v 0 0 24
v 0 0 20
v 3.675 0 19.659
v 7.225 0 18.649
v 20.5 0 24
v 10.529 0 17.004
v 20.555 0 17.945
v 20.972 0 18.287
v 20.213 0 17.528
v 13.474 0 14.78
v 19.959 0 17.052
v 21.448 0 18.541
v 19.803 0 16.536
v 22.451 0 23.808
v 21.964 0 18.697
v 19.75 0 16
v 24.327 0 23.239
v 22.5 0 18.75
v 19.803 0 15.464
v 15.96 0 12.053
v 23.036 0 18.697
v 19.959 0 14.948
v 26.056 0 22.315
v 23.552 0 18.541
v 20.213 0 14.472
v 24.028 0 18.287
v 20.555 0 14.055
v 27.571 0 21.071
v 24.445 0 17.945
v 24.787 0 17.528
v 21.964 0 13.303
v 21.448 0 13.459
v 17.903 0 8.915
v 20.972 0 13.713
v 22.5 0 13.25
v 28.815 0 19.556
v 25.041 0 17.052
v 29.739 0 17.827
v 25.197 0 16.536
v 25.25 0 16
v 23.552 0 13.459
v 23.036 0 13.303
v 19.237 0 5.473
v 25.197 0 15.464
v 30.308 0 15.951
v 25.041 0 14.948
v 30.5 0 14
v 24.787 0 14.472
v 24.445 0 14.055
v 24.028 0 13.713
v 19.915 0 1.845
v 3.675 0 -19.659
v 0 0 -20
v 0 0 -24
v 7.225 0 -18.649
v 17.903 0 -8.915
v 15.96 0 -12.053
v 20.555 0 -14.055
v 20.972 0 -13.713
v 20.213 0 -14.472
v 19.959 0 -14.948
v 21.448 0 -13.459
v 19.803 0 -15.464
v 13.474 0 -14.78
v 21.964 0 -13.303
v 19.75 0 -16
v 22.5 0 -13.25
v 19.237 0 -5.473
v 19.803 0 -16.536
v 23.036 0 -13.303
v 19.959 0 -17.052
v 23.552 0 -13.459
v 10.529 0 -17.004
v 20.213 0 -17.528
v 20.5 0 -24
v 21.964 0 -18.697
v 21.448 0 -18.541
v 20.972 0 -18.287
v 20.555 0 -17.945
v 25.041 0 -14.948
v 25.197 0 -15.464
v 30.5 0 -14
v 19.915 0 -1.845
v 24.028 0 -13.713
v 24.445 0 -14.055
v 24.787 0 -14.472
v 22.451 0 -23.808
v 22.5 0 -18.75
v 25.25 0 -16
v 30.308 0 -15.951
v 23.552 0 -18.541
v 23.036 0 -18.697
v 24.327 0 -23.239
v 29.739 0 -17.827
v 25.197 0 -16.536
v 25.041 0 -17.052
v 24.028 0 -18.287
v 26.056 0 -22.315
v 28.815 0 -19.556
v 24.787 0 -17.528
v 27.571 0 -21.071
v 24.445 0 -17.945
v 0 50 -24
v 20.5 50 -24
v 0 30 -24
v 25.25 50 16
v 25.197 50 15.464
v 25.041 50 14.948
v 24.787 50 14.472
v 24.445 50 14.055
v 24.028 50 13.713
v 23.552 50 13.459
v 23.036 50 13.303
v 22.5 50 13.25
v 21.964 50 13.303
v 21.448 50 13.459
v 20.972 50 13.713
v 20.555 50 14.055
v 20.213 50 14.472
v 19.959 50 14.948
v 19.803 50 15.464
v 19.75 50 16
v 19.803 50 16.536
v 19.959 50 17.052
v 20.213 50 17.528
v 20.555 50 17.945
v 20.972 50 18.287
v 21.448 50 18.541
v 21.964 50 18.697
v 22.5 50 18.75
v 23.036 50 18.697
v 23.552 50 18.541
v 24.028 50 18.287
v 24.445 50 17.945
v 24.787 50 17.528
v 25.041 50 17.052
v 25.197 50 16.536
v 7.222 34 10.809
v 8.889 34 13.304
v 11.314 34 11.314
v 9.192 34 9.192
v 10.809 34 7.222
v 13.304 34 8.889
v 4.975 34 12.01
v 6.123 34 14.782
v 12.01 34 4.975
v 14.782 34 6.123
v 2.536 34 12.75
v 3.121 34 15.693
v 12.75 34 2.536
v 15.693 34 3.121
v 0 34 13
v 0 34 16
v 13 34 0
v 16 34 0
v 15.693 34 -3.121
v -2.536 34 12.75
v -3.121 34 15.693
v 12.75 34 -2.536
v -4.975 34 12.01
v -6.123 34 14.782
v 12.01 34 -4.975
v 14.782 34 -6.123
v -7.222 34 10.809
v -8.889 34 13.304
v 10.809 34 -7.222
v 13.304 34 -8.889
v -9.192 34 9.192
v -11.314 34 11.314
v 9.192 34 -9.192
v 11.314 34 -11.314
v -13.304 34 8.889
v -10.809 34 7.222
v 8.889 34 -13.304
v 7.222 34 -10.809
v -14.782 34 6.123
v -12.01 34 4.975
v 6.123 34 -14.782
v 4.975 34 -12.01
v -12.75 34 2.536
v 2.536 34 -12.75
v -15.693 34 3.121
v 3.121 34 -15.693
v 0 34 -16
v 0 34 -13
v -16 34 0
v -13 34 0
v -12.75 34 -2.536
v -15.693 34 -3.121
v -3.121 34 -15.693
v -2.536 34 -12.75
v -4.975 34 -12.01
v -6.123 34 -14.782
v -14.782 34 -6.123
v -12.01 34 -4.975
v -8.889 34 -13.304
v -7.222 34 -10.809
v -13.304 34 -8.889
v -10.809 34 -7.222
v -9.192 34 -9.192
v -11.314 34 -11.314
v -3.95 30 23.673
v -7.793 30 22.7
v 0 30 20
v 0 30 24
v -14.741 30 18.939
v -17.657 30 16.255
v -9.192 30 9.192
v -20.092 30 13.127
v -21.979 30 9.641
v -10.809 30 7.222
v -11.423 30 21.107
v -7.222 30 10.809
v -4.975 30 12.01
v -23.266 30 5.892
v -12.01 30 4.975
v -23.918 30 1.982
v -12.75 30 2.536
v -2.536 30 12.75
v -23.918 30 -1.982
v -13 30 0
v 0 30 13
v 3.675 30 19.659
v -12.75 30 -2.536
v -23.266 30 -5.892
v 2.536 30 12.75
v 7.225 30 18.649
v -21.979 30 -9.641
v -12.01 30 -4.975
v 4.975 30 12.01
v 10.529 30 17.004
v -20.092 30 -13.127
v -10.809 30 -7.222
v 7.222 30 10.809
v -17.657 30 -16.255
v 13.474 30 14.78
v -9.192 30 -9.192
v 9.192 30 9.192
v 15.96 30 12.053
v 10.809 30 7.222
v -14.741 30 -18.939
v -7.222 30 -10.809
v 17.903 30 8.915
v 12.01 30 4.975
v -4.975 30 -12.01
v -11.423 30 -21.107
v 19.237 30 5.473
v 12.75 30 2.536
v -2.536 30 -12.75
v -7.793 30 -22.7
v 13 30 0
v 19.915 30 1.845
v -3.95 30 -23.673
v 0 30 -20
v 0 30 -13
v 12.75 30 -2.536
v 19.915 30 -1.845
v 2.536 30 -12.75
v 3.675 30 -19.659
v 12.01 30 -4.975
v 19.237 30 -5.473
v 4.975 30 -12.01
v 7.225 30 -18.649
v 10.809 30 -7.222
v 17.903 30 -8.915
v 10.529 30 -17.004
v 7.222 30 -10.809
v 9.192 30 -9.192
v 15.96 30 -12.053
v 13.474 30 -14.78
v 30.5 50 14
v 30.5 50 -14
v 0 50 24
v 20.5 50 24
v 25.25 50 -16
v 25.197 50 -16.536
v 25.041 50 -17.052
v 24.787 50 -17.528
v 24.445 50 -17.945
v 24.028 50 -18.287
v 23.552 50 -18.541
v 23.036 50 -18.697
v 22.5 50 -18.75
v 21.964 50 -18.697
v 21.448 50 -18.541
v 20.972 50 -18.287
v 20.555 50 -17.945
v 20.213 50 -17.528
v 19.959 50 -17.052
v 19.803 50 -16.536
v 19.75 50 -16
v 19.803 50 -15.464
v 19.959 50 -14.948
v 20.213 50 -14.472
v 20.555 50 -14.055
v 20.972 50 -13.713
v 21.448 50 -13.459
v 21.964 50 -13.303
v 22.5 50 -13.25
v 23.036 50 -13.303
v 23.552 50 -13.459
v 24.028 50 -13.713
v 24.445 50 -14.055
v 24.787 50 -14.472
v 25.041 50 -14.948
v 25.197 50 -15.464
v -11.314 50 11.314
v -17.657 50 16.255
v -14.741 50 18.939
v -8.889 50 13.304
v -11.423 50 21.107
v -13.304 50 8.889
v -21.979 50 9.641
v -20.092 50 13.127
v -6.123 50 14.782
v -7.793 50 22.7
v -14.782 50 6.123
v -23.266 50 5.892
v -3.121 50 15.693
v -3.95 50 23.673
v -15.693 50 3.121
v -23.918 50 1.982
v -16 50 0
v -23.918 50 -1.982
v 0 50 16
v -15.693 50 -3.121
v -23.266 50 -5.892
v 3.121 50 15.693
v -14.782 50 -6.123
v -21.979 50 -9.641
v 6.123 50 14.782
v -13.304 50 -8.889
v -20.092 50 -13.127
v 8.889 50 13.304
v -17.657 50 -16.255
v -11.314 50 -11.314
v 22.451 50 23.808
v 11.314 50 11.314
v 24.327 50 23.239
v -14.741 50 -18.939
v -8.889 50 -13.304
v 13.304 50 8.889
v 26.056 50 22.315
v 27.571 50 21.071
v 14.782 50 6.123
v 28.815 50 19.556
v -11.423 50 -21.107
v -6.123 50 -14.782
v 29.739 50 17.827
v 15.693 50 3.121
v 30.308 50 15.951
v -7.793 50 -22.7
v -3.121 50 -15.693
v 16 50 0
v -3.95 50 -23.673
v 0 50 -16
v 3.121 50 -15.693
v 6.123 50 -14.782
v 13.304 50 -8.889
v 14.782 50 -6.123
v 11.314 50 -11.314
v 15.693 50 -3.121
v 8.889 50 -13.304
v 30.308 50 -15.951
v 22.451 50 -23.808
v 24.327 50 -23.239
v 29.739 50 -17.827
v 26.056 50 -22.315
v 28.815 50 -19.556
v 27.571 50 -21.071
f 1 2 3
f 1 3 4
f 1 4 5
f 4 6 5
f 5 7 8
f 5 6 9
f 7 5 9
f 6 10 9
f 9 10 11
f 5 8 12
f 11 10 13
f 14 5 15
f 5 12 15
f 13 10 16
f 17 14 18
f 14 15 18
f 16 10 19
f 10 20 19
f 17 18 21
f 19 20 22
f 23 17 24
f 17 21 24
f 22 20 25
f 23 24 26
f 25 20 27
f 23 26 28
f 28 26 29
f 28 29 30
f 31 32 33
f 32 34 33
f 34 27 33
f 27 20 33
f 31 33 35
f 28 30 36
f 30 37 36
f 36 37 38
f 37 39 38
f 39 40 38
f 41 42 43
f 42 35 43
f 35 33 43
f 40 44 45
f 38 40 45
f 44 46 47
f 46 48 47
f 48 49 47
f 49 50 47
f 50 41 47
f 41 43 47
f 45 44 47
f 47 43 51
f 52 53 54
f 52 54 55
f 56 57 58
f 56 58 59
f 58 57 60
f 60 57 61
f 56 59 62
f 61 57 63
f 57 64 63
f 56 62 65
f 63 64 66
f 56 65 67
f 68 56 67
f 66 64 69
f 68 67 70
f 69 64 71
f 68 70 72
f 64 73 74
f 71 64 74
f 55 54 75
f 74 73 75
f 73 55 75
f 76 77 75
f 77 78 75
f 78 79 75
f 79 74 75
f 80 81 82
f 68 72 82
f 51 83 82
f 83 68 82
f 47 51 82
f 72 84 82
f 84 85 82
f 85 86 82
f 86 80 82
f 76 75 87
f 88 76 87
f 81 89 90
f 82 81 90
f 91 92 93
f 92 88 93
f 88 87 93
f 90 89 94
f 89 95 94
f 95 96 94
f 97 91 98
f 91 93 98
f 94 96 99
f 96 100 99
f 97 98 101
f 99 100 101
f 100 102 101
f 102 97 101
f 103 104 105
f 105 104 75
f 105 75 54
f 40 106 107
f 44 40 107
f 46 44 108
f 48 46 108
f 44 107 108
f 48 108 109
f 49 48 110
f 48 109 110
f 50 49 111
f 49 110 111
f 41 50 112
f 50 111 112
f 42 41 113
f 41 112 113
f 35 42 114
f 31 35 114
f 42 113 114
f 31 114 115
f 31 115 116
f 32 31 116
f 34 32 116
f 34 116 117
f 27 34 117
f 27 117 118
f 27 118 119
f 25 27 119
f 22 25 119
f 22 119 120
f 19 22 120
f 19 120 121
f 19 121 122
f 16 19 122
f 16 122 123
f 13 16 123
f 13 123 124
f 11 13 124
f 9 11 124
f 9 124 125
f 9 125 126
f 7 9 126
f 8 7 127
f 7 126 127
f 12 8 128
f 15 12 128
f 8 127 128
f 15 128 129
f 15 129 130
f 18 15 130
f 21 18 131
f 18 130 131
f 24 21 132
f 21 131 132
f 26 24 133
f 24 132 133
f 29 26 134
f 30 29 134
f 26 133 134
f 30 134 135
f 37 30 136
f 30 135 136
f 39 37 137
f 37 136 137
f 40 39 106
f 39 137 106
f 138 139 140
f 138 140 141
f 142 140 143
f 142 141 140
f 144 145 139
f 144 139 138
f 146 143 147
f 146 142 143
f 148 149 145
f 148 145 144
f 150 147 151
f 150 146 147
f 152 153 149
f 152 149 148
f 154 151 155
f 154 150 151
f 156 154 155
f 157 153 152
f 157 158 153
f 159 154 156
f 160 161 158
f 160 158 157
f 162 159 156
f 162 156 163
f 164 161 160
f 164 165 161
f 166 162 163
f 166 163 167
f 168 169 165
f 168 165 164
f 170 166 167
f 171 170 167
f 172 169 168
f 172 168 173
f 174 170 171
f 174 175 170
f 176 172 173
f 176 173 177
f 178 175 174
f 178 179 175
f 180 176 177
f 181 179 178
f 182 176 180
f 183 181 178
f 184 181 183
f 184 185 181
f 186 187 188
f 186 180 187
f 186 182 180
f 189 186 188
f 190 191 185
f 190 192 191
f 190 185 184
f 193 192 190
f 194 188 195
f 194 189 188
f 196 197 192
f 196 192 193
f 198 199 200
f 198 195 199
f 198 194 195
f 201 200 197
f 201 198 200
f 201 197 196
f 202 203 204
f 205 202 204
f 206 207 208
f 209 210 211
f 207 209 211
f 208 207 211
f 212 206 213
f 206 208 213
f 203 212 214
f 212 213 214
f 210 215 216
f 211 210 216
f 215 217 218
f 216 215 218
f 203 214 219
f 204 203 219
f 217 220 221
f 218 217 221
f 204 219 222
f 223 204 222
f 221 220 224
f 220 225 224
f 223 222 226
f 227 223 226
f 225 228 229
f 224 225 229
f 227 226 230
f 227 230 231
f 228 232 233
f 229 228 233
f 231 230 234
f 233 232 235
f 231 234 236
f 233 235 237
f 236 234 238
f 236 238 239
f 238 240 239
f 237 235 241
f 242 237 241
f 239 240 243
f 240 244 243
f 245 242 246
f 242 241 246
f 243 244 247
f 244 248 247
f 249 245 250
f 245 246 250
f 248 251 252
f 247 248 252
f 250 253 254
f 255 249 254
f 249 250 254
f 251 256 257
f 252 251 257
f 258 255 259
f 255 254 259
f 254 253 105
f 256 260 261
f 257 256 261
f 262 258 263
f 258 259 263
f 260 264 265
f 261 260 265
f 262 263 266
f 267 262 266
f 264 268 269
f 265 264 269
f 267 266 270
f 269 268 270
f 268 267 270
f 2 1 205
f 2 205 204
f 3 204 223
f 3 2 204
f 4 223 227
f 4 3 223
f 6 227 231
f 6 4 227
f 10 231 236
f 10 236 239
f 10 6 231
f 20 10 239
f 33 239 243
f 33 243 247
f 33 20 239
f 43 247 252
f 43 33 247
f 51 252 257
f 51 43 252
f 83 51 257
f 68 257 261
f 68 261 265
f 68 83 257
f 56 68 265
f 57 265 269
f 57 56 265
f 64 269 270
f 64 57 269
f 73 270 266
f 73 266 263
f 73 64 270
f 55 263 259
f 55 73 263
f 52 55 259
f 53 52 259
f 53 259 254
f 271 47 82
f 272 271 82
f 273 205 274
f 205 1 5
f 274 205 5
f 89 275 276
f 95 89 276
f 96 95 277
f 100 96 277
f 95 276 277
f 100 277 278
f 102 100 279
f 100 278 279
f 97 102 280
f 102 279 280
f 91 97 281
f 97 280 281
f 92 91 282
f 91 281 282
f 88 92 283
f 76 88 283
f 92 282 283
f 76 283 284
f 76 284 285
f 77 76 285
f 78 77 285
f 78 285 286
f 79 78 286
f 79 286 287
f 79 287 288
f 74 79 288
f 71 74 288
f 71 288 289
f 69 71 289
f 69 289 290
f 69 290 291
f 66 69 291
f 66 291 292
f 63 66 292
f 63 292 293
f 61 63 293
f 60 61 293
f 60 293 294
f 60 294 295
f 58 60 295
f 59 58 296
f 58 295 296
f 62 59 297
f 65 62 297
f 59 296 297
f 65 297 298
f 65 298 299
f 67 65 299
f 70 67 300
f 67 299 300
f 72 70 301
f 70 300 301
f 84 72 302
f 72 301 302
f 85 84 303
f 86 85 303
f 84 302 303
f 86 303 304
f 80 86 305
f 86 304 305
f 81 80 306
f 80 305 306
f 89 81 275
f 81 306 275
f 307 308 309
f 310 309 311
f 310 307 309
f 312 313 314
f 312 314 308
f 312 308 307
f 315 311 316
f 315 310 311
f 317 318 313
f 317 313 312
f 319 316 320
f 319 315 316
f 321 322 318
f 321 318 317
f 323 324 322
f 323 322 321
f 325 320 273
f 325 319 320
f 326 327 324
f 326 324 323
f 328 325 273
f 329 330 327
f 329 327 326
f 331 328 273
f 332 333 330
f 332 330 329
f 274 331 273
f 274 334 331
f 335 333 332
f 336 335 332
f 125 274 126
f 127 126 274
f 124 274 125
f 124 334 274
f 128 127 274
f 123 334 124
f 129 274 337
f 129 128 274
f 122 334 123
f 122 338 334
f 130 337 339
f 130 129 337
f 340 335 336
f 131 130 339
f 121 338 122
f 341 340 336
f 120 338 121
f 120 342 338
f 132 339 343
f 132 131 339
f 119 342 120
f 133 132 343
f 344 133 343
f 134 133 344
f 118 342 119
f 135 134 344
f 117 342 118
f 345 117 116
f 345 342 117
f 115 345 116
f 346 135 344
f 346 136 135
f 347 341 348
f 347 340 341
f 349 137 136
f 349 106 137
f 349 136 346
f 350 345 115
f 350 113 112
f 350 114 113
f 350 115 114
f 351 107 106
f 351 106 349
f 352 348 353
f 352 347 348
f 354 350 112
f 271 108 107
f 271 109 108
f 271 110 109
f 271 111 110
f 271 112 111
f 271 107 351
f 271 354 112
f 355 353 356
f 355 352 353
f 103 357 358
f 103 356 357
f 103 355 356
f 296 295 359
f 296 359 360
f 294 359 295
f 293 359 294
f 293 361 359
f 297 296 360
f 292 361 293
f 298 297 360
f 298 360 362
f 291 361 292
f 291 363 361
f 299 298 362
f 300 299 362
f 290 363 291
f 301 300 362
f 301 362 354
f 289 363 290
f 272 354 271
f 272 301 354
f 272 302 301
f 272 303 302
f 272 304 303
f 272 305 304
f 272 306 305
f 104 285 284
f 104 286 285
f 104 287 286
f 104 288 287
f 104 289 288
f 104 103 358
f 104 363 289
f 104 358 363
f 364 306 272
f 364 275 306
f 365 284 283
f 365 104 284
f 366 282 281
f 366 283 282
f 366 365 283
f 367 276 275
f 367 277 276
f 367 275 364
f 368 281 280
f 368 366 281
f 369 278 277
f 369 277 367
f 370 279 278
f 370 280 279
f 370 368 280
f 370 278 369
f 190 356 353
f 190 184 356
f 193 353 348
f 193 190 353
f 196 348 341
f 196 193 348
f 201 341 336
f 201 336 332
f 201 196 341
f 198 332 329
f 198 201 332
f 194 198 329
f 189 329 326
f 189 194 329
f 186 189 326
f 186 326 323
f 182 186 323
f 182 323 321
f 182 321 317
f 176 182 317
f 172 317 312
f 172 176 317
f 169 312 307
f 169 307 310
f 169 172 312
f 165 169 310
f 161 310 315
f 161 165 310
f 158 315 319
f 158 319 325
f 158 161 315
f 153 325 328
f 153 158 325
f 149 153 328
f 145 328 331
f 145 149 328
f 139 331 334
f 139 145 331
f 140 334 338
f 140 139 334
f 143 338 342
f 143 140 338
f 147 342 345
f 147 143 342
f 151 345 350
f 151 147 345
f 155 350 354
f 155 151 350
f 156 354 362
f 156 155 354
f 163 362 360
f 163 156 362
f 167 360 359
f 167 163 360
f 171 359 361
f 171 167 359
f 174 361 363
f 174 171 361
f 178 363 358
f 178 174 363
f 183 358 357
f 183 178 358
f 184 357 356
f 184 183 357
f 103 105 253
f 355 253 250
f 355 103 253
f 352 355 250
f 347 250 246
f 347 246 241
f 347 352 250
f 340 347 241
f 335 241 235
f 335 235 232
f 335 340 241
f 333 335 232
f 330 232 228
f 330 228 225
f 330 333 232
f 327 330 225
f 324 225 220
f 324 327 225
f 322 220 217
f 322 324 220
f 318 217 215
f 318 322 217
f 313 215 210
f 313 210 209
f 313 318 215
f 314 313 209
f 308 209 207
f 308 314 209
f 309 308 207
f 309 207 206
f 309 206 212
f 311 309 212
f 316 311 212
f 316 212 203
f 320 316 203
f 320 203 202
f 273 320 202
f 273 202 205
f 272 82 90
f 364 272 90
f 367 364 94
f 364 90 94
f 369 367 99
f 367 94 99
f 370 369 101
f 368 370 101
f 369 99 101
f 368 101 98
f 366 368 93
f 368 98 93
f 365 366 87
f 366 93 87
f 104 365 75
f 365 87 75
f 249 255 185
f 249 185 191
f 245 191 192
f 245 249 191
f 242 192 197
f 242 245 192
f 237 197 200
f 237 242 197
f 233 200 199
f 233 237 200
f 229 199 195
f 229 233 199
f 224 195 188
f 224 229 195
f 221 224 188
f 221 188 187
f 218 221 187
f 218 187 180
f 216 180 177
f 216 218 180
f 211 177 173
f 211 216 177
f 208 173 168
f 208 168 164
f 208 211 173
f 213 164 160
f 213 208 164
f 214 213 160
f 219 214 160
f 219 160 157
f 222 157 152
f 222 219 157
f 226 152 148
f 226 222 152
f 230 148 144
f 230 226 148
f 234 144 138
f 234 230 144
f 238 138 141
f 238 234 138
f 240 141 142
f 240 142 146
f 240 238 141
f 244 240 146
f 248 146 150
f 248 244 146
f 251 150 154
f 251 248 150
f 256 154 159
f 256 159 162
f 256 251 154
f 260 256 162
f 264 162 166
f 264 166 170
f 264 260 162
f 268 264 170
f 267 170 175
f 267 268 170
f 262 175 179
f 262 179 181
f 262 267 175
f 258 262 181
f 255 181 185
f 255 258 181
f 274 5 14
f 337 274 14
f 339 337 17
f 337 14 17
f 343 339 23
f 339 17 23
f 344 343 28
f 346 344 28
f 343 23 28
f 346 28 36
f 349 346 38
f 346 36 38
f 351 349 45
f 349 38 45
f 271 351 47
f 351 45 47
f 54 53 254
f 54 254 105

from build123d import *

# Parameters (mm, degrees)
SKETCH5_W            = 38.79143083
SKETCH5_H            = 48
CUT_EXTRUDE1_DEPTH   = 30
BOSS_EXTRUDE1_START  = -50
BOSS_EXTRUDE1_DEPTH  = 50
M5_CLEARANCE_HOLE1_D = 5.5


with BuildPart() as part:
    # Sketch1 → Revolve1 (revolve)
    with BuildSketch(Plane.XY, mode=Mode.PRIVATE) as revolve1_sk:
        Polygon((-24, 0), (-24, 50), (-16, 50), (-16, 34), (-13, 34), (-13, 30), (-16, 30), (-20, 30), (-20, 0), align=None)
    revolve(revolve1_sk.sketch.rotate(Axis((0, 0, 0), (0, 1, 0)), 270), axis=Axis((0, 0, 0), (0, 1, 0)))

    # Sketch5 → Cut-Extrude1 (cut)
    with BuildSketch(Plane(origin=(0, 0, 0), x_dir=(1, 0, 0), z_dir=(0, 1, 0))):
        with Locations((-19.395715415, 0)):
            Rectangle(SKETCH5_W, SKETCH5_H)
    extrude(amount=CUT_EXTRUDE1_DEPTH, mode=Mode.SUBTRACT)

    # Sketch6 → Boss-Extrude1 (add)
    with BuildSketch(Plane(origin=(0, 50, 0), x_dir=(1, 0, 0), z_dir=(0, 1, 0)).offset(BOSS_EXTRUDE1_START)):
        with BuildLine():
            Line((0, -24), (20.5, -24))
            ThreePointArc((20.5, -24), (27.571067812, -21.071067812), (30.5, -14))
            Line((30.5, -14), (30.5, 14))
            ThreePointArc((30.5, 14), (27.571067812, 21.071067812), (20.5, 24))
            Line((20.5, 24), (0, 24))
            ThreePointArc((0, 24), (24, 0), (0, -24))
        make_face()
    extrude(amount=BOSS_EXTRUDE1_DEPTH)

    # M5 Clearance Hole1 (through all)
    with Locations(Plane(origin=(0, 0, 0), x_dir=(-1, 0, 0), z_dir=(0, -1, 0))):
        with Locations((-22.5, -16), (-22.5, 16)):
            Hole(M5_CLEARANCE_HOLE1_D / 2)


solid = part.part
